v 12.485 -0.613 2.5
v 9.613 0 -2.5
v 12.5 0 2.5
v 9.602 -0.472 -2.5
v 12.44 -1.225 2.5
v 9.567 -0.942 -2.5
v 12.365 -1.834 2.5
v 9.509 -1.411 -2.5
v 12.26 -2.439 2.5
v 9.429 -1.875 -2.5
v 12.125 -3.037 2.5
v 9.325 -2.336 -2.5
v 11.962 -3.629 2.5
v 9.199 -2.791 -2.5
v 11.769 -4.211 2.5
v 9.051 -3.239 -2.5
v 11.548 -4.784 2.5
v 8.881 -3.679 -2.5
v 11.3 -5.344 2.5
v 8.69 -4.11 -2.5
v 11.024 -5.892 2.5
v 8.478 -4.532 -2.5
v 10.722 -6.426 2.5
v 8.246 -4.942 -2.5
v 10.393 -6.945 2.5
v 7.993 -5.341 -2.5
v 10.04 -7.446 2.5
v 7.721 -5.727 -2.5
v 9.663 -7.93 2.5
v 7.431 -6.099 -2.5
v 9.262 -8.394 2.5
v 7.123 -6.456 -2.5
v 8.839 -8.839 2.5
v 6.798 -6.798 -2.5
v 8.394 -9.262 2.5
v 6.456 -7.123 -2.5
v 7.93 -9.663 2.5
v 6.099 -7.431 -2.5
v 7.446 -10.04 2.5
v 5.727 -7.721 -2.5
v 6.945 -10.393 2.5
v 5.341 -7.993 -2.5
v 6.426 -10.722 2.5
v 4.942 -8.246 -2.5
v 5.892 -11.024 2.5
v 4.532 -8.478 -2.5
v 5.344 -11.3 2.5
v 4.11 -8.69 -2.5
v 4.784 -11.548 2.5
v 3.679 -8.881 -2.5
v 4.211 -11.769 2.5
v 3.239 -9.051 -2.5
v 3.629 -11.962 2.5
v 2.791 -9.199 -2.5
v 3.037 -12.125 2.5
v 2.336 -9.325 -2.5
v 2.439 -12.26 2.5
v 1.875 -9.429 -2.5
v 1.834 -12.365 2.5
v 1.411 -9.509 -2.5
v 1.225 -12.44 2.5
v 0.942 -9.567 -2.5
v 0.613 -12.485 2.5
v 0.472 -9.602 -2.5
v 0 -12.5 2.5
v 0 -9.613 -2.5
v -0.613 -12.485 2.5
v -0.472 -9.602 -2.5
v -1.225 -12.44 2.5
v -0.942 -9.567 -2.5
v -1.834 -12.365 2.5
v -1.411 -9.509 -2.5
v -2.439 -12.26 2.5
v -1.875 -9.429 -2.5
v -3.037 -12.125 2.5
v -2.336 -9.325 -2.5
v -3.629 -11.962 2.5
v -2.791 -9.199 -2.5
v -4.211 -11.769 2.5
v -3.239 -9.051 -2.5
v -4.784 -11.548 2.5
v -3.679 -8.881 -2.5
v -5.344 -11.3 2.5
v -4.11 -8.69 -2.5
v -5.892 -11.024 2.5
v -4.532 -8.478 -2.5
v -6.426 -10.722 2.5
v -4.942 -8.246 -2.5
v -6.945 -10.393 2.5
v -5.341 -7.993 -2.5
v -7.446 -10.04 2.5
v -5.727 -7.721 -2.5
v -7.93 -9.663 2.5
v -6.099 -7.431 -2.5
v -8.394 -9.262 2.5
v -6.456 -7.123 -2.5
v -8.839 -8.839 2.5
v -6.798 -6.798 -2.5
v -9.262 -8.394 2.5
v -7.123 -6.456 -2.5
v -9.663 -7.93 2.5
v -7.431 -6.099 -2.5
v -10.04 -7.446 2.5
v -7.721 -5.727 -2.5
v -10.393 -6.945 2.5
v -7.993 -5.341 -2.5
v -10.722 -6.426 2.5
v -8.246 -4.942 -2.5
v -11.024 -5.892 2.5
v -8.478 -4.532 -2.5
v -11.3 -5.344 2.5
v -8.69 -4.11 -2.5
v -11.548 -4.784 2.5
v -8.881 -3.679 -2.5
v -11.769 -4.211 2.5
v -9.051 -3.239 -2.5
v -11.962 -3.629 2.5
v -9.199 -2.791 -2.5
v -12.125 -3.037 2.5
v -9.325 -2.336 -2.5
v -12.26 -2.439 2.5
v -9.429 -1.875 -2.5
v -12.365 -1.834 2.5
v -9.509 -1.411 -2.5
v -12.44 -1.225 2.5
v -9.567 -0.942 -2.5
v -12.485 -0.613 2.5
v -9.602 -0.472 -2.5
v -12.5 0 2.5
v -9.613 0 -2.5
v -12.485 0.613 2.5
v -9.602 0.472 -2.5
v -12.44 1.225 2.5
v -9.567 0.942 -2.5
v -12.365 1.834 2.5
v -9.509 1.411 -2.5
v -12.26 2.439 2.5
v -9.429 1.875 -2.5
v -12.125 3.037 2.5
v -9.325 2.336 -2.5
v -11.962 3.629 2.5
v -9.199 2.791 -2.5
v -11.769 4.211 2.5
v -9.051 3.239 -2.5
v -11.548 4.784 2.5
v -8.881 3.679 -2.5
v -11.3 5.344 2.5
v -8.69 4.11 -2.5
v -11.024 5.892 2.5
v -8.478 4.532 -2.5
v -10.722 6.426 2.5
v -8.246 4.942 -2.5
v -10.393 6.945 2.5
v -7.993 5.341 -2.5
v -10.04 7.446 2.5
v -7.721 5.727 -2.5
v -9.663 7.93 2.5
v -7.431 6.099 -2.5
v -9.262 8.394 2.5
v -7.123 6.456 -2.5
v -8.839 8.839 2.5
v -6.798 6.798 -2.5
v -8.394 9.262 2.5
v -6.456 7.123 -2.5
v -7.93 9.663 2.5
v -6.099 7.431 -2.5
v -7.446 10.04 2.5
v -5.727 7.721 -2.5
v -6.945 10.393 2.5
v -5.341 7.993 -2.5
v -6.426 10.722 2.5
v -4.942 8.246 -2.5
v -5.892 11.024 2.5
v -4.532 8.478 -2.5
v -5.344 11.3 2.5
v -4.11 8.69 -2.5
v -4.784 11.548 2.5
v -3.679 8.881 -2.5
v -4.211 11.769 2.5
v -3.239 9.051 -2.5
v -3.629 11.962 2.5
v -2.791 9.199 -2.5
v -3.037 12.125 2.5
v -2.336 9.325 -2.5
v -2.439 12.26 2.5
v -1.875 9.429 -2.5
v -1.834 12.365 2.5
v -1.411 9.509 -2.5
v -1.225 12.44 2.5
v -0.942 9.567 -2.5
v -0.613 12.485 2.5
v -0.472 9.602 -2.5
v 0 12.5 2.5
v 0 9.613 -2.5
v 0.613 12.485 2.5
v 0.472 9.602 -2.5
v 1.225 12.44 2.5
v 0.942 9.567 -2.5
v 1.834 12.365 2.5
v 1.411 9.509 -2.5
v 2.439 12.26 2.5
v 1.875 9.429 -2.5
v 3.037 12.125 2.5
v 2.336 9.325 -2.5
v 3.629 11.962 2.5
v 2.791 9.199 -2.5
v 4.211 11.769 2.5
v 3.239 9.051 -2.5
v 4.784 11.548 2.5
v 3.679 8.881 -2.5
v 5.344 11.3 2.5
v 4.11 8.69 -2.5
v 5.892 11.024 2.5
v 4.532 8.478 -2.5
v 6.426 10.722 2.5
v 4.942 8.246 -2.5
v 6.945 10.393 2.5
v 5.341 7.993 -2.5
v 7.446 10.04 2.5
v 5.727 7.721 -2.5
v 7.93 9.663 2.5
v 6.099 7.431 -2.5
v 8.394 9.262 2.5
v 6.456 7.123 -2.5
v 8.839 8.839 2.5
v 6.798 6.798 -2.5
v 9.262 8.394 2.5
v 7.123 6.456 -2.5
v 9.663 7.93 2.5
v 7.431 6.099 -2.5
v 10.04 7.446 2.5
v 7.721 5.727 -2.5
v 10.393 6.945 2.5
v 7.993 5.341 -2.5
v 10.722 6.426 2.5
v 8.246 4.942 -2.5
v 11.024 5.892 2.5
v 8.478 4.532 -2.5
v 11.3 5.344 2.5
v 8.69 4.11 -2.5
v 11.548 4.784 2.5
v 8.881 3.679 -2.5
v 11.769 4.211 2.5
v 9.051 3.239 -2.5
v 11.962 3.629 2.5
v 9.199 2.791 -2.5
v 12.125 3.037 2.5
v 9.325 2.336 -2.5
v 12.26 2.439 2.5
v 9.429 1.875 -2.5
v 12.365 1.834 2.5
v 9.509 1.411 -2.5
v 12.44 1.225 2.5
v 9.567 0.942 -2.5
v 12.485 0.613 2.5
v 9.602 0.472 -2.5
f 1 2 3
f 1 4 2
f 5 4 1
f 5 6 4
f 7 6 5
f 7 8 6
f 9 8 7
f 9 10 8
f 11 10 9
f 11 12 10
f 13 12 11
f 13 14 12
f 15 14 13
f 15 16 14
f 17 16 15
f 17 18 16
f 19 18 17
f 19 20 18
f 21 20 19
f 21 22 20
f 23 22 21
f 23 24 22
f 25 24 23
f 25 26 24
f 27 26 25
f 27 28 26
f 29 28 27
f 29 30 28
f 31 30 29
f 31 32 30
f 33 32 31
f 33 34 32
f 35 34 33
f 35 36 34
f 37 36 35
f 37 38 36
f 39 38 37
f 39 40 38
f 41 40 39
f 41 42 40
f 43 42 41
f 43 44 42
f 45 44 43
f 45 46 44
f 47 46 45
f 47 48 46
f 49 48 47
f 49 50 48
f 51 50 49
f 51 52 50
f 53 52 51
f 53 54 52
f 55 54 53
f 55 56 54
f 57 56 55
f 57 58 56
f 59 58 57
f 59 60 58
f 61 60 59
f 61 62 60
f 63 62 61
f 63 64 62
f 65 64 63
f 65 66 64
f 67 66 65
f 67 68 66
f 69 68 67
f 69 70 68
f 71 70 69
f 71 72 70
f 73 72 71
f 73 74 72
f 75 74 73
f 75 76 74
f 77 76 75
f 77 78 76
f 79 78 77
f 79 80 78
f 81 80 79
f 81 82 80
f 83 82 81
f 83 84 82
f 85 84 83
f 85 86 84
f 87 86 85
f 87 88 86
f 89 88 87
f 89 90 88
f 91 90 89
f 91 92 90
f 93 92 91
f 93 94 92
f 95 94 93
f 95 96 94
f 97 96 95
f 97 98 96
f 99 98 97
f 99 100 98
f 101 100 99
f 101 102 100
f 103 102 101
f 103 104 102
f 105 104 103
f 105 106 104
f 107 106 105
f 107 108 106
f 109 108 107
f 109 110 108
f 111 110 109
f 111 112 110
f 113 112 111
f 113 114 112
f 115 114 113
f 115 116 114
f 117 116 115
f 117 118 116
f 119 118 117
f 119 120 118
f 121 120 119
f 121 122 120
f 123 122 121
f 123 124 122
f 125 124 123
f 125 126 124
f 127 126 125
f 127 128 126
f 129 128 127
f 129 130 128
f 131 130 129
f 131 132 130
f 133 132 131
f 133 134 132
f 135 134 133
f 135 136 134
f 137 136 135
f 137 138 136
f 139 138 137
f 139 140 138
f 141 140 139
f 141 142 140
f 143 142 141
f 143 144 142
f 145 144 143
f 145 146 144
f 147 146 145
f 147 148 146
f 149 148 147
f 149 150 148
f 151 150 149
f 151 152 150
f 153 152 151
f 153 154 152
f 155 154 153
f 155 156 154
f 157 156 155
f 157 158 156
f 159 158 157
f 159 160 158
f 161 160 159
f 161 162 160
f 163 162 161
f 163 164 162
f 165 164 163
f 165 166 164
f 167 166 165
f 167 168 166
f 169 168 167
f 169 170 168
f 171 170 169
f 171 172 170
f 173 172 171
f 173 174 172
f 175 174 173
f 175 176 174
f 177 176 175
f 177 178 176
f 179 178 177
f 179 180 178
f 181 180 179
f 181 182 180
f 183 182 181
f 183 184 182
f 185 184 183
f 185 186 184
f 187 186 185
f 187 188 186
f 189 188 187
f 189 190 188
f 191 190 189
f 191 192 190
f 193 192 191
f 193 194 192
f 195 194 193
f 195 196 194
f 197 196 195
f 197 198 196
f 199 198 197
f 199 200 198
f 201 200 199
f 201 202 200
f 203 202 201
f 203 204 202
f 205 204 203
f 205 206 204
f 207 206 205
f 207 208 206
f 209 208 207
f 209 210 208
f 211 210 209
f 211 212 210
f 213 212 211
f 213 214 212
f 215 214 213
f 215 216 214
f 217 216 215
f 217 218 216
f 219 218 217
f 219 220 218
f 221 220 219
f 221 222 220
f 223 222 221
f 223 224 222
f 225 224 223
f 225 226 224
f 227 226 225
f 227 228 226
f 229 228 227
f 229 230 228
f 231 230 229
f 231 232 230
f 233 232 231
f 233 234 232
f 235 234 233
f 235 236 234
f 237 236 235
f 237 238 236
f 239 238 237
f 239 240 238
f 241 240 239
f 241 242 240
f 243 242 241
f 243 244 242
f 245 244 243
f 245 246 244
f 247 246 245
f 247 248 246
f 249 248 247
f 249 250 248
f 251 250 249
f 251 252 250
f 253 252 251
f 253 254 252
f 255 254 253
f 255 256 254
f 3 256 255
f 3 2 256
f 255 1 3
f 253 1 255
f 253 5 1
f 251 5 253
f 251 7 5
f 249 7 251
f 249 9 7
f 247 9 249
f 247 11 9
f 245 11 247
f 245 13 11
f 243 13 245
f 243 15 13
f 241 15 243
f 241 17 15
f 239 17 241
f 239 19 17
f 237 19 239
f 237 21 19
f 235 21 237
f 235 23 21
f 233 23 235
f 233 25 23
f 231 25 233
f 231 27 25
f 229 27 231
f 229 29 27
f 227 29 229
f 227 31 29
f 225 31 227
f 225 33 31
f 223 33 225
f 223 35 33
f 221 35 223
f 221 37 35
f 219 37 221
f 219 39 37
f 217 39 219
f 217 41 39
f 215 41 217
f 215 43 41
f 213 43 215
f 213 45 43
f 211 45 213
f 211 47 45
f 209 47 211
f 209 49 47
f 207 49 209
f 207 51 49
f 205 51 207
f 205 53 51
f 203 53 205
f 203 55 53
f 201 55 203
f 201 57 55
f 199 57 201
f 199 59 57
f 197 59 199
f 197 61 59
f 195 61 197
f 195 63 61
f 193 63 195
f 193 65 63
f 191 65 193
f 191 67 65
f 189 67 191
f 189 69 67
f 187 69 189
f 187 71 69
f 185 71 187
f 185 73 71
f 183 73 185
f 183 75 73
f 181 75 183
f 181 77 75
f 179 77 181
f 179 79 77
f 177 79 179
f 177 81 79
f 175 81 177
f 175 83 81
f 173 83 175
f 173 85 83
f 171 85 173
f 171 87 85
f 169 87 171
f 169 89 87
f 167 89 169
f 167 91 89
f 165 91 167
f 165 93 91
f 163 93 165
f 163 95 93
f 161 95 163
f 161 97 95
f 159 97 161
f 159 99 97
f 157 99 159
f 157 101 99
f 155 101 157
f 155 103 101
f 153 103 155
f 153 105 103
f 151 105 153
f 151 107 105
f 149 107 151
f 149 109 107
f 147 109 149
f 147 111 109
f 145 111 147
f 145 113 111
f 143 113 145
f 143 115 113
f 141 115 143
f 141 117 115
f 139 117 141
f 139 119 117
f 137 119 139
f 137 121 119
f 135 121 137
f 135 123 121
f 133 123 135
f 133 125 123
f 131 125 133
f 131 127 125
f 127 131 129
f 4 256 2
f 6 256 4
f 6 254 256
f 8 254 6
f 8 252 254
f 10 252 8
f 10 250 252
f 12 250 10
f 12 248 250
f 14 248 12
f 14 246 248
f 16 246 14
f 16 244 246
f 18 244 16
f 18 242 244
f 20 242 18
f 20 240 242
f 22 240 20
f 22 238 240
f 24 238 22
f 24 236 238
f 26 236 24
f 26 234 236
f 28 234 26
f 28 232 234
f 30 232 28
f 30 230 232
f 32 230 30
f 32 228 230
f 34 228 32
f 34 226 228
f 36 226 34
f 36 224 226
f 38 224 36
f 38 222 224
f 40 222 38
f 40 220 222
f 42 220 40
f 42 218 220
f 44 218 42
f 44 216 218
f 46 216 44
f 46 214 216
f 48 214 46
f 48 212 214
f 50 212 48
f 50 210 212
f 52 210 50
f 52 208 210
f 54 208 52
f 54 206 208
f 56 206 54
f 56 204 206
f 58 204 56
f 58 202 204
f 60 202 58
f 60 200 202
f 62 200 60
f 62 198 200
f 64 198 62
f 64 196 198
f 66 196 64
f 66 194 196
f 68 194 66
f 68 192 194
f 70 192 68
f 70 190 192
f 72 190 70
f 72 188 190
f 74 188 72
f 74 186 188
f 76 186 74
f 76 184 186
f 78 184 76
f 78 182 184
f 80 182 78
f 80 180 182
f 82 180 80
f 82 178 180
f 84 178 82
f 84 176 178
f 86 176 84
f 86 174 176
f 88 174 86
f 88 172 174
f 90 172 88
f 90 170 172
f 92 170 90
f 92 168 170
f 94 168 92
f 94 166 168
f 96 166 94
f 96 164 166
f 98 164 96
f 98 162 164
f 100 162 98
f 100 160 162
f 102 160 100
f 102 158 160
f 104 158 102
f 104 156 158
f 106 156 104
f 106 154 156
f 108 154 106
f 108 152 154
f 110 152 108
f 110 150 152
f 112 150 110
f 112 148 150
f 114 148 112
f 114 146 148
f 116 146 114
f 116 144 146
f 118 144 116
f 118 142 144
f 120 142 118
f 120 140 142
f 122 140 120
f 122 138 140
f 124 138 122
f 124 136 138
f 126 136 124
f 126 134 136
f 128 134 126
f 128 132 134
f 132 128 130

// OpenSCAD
function calc_d2(h, d1, angle) = d1 - 2 * h * tan(angle);
//$fn = $preview ? 16 : 128;

height = 5;
base_diameter = 25;

$fn = 4;

module overhang(sides, angle, base_size, height) {
  rotate(180, [1, 0, 0]) {
    $fn = sides;
    cylinder(d1=base_size, d2=calc_d2(height, base_size, angle), h=height, center=true);
  }
}

// rect 45
//overhang(4, 45, base_diameter, height);

// rect 30
//overhang(4, 30, base_diameter, height);

// cyl 45
//overhang($preview ? 16 : 128, 45, base_diameter, height);

// cyl 30
overhang($preview ? 16 : 128, 30, base_diameter, height);
